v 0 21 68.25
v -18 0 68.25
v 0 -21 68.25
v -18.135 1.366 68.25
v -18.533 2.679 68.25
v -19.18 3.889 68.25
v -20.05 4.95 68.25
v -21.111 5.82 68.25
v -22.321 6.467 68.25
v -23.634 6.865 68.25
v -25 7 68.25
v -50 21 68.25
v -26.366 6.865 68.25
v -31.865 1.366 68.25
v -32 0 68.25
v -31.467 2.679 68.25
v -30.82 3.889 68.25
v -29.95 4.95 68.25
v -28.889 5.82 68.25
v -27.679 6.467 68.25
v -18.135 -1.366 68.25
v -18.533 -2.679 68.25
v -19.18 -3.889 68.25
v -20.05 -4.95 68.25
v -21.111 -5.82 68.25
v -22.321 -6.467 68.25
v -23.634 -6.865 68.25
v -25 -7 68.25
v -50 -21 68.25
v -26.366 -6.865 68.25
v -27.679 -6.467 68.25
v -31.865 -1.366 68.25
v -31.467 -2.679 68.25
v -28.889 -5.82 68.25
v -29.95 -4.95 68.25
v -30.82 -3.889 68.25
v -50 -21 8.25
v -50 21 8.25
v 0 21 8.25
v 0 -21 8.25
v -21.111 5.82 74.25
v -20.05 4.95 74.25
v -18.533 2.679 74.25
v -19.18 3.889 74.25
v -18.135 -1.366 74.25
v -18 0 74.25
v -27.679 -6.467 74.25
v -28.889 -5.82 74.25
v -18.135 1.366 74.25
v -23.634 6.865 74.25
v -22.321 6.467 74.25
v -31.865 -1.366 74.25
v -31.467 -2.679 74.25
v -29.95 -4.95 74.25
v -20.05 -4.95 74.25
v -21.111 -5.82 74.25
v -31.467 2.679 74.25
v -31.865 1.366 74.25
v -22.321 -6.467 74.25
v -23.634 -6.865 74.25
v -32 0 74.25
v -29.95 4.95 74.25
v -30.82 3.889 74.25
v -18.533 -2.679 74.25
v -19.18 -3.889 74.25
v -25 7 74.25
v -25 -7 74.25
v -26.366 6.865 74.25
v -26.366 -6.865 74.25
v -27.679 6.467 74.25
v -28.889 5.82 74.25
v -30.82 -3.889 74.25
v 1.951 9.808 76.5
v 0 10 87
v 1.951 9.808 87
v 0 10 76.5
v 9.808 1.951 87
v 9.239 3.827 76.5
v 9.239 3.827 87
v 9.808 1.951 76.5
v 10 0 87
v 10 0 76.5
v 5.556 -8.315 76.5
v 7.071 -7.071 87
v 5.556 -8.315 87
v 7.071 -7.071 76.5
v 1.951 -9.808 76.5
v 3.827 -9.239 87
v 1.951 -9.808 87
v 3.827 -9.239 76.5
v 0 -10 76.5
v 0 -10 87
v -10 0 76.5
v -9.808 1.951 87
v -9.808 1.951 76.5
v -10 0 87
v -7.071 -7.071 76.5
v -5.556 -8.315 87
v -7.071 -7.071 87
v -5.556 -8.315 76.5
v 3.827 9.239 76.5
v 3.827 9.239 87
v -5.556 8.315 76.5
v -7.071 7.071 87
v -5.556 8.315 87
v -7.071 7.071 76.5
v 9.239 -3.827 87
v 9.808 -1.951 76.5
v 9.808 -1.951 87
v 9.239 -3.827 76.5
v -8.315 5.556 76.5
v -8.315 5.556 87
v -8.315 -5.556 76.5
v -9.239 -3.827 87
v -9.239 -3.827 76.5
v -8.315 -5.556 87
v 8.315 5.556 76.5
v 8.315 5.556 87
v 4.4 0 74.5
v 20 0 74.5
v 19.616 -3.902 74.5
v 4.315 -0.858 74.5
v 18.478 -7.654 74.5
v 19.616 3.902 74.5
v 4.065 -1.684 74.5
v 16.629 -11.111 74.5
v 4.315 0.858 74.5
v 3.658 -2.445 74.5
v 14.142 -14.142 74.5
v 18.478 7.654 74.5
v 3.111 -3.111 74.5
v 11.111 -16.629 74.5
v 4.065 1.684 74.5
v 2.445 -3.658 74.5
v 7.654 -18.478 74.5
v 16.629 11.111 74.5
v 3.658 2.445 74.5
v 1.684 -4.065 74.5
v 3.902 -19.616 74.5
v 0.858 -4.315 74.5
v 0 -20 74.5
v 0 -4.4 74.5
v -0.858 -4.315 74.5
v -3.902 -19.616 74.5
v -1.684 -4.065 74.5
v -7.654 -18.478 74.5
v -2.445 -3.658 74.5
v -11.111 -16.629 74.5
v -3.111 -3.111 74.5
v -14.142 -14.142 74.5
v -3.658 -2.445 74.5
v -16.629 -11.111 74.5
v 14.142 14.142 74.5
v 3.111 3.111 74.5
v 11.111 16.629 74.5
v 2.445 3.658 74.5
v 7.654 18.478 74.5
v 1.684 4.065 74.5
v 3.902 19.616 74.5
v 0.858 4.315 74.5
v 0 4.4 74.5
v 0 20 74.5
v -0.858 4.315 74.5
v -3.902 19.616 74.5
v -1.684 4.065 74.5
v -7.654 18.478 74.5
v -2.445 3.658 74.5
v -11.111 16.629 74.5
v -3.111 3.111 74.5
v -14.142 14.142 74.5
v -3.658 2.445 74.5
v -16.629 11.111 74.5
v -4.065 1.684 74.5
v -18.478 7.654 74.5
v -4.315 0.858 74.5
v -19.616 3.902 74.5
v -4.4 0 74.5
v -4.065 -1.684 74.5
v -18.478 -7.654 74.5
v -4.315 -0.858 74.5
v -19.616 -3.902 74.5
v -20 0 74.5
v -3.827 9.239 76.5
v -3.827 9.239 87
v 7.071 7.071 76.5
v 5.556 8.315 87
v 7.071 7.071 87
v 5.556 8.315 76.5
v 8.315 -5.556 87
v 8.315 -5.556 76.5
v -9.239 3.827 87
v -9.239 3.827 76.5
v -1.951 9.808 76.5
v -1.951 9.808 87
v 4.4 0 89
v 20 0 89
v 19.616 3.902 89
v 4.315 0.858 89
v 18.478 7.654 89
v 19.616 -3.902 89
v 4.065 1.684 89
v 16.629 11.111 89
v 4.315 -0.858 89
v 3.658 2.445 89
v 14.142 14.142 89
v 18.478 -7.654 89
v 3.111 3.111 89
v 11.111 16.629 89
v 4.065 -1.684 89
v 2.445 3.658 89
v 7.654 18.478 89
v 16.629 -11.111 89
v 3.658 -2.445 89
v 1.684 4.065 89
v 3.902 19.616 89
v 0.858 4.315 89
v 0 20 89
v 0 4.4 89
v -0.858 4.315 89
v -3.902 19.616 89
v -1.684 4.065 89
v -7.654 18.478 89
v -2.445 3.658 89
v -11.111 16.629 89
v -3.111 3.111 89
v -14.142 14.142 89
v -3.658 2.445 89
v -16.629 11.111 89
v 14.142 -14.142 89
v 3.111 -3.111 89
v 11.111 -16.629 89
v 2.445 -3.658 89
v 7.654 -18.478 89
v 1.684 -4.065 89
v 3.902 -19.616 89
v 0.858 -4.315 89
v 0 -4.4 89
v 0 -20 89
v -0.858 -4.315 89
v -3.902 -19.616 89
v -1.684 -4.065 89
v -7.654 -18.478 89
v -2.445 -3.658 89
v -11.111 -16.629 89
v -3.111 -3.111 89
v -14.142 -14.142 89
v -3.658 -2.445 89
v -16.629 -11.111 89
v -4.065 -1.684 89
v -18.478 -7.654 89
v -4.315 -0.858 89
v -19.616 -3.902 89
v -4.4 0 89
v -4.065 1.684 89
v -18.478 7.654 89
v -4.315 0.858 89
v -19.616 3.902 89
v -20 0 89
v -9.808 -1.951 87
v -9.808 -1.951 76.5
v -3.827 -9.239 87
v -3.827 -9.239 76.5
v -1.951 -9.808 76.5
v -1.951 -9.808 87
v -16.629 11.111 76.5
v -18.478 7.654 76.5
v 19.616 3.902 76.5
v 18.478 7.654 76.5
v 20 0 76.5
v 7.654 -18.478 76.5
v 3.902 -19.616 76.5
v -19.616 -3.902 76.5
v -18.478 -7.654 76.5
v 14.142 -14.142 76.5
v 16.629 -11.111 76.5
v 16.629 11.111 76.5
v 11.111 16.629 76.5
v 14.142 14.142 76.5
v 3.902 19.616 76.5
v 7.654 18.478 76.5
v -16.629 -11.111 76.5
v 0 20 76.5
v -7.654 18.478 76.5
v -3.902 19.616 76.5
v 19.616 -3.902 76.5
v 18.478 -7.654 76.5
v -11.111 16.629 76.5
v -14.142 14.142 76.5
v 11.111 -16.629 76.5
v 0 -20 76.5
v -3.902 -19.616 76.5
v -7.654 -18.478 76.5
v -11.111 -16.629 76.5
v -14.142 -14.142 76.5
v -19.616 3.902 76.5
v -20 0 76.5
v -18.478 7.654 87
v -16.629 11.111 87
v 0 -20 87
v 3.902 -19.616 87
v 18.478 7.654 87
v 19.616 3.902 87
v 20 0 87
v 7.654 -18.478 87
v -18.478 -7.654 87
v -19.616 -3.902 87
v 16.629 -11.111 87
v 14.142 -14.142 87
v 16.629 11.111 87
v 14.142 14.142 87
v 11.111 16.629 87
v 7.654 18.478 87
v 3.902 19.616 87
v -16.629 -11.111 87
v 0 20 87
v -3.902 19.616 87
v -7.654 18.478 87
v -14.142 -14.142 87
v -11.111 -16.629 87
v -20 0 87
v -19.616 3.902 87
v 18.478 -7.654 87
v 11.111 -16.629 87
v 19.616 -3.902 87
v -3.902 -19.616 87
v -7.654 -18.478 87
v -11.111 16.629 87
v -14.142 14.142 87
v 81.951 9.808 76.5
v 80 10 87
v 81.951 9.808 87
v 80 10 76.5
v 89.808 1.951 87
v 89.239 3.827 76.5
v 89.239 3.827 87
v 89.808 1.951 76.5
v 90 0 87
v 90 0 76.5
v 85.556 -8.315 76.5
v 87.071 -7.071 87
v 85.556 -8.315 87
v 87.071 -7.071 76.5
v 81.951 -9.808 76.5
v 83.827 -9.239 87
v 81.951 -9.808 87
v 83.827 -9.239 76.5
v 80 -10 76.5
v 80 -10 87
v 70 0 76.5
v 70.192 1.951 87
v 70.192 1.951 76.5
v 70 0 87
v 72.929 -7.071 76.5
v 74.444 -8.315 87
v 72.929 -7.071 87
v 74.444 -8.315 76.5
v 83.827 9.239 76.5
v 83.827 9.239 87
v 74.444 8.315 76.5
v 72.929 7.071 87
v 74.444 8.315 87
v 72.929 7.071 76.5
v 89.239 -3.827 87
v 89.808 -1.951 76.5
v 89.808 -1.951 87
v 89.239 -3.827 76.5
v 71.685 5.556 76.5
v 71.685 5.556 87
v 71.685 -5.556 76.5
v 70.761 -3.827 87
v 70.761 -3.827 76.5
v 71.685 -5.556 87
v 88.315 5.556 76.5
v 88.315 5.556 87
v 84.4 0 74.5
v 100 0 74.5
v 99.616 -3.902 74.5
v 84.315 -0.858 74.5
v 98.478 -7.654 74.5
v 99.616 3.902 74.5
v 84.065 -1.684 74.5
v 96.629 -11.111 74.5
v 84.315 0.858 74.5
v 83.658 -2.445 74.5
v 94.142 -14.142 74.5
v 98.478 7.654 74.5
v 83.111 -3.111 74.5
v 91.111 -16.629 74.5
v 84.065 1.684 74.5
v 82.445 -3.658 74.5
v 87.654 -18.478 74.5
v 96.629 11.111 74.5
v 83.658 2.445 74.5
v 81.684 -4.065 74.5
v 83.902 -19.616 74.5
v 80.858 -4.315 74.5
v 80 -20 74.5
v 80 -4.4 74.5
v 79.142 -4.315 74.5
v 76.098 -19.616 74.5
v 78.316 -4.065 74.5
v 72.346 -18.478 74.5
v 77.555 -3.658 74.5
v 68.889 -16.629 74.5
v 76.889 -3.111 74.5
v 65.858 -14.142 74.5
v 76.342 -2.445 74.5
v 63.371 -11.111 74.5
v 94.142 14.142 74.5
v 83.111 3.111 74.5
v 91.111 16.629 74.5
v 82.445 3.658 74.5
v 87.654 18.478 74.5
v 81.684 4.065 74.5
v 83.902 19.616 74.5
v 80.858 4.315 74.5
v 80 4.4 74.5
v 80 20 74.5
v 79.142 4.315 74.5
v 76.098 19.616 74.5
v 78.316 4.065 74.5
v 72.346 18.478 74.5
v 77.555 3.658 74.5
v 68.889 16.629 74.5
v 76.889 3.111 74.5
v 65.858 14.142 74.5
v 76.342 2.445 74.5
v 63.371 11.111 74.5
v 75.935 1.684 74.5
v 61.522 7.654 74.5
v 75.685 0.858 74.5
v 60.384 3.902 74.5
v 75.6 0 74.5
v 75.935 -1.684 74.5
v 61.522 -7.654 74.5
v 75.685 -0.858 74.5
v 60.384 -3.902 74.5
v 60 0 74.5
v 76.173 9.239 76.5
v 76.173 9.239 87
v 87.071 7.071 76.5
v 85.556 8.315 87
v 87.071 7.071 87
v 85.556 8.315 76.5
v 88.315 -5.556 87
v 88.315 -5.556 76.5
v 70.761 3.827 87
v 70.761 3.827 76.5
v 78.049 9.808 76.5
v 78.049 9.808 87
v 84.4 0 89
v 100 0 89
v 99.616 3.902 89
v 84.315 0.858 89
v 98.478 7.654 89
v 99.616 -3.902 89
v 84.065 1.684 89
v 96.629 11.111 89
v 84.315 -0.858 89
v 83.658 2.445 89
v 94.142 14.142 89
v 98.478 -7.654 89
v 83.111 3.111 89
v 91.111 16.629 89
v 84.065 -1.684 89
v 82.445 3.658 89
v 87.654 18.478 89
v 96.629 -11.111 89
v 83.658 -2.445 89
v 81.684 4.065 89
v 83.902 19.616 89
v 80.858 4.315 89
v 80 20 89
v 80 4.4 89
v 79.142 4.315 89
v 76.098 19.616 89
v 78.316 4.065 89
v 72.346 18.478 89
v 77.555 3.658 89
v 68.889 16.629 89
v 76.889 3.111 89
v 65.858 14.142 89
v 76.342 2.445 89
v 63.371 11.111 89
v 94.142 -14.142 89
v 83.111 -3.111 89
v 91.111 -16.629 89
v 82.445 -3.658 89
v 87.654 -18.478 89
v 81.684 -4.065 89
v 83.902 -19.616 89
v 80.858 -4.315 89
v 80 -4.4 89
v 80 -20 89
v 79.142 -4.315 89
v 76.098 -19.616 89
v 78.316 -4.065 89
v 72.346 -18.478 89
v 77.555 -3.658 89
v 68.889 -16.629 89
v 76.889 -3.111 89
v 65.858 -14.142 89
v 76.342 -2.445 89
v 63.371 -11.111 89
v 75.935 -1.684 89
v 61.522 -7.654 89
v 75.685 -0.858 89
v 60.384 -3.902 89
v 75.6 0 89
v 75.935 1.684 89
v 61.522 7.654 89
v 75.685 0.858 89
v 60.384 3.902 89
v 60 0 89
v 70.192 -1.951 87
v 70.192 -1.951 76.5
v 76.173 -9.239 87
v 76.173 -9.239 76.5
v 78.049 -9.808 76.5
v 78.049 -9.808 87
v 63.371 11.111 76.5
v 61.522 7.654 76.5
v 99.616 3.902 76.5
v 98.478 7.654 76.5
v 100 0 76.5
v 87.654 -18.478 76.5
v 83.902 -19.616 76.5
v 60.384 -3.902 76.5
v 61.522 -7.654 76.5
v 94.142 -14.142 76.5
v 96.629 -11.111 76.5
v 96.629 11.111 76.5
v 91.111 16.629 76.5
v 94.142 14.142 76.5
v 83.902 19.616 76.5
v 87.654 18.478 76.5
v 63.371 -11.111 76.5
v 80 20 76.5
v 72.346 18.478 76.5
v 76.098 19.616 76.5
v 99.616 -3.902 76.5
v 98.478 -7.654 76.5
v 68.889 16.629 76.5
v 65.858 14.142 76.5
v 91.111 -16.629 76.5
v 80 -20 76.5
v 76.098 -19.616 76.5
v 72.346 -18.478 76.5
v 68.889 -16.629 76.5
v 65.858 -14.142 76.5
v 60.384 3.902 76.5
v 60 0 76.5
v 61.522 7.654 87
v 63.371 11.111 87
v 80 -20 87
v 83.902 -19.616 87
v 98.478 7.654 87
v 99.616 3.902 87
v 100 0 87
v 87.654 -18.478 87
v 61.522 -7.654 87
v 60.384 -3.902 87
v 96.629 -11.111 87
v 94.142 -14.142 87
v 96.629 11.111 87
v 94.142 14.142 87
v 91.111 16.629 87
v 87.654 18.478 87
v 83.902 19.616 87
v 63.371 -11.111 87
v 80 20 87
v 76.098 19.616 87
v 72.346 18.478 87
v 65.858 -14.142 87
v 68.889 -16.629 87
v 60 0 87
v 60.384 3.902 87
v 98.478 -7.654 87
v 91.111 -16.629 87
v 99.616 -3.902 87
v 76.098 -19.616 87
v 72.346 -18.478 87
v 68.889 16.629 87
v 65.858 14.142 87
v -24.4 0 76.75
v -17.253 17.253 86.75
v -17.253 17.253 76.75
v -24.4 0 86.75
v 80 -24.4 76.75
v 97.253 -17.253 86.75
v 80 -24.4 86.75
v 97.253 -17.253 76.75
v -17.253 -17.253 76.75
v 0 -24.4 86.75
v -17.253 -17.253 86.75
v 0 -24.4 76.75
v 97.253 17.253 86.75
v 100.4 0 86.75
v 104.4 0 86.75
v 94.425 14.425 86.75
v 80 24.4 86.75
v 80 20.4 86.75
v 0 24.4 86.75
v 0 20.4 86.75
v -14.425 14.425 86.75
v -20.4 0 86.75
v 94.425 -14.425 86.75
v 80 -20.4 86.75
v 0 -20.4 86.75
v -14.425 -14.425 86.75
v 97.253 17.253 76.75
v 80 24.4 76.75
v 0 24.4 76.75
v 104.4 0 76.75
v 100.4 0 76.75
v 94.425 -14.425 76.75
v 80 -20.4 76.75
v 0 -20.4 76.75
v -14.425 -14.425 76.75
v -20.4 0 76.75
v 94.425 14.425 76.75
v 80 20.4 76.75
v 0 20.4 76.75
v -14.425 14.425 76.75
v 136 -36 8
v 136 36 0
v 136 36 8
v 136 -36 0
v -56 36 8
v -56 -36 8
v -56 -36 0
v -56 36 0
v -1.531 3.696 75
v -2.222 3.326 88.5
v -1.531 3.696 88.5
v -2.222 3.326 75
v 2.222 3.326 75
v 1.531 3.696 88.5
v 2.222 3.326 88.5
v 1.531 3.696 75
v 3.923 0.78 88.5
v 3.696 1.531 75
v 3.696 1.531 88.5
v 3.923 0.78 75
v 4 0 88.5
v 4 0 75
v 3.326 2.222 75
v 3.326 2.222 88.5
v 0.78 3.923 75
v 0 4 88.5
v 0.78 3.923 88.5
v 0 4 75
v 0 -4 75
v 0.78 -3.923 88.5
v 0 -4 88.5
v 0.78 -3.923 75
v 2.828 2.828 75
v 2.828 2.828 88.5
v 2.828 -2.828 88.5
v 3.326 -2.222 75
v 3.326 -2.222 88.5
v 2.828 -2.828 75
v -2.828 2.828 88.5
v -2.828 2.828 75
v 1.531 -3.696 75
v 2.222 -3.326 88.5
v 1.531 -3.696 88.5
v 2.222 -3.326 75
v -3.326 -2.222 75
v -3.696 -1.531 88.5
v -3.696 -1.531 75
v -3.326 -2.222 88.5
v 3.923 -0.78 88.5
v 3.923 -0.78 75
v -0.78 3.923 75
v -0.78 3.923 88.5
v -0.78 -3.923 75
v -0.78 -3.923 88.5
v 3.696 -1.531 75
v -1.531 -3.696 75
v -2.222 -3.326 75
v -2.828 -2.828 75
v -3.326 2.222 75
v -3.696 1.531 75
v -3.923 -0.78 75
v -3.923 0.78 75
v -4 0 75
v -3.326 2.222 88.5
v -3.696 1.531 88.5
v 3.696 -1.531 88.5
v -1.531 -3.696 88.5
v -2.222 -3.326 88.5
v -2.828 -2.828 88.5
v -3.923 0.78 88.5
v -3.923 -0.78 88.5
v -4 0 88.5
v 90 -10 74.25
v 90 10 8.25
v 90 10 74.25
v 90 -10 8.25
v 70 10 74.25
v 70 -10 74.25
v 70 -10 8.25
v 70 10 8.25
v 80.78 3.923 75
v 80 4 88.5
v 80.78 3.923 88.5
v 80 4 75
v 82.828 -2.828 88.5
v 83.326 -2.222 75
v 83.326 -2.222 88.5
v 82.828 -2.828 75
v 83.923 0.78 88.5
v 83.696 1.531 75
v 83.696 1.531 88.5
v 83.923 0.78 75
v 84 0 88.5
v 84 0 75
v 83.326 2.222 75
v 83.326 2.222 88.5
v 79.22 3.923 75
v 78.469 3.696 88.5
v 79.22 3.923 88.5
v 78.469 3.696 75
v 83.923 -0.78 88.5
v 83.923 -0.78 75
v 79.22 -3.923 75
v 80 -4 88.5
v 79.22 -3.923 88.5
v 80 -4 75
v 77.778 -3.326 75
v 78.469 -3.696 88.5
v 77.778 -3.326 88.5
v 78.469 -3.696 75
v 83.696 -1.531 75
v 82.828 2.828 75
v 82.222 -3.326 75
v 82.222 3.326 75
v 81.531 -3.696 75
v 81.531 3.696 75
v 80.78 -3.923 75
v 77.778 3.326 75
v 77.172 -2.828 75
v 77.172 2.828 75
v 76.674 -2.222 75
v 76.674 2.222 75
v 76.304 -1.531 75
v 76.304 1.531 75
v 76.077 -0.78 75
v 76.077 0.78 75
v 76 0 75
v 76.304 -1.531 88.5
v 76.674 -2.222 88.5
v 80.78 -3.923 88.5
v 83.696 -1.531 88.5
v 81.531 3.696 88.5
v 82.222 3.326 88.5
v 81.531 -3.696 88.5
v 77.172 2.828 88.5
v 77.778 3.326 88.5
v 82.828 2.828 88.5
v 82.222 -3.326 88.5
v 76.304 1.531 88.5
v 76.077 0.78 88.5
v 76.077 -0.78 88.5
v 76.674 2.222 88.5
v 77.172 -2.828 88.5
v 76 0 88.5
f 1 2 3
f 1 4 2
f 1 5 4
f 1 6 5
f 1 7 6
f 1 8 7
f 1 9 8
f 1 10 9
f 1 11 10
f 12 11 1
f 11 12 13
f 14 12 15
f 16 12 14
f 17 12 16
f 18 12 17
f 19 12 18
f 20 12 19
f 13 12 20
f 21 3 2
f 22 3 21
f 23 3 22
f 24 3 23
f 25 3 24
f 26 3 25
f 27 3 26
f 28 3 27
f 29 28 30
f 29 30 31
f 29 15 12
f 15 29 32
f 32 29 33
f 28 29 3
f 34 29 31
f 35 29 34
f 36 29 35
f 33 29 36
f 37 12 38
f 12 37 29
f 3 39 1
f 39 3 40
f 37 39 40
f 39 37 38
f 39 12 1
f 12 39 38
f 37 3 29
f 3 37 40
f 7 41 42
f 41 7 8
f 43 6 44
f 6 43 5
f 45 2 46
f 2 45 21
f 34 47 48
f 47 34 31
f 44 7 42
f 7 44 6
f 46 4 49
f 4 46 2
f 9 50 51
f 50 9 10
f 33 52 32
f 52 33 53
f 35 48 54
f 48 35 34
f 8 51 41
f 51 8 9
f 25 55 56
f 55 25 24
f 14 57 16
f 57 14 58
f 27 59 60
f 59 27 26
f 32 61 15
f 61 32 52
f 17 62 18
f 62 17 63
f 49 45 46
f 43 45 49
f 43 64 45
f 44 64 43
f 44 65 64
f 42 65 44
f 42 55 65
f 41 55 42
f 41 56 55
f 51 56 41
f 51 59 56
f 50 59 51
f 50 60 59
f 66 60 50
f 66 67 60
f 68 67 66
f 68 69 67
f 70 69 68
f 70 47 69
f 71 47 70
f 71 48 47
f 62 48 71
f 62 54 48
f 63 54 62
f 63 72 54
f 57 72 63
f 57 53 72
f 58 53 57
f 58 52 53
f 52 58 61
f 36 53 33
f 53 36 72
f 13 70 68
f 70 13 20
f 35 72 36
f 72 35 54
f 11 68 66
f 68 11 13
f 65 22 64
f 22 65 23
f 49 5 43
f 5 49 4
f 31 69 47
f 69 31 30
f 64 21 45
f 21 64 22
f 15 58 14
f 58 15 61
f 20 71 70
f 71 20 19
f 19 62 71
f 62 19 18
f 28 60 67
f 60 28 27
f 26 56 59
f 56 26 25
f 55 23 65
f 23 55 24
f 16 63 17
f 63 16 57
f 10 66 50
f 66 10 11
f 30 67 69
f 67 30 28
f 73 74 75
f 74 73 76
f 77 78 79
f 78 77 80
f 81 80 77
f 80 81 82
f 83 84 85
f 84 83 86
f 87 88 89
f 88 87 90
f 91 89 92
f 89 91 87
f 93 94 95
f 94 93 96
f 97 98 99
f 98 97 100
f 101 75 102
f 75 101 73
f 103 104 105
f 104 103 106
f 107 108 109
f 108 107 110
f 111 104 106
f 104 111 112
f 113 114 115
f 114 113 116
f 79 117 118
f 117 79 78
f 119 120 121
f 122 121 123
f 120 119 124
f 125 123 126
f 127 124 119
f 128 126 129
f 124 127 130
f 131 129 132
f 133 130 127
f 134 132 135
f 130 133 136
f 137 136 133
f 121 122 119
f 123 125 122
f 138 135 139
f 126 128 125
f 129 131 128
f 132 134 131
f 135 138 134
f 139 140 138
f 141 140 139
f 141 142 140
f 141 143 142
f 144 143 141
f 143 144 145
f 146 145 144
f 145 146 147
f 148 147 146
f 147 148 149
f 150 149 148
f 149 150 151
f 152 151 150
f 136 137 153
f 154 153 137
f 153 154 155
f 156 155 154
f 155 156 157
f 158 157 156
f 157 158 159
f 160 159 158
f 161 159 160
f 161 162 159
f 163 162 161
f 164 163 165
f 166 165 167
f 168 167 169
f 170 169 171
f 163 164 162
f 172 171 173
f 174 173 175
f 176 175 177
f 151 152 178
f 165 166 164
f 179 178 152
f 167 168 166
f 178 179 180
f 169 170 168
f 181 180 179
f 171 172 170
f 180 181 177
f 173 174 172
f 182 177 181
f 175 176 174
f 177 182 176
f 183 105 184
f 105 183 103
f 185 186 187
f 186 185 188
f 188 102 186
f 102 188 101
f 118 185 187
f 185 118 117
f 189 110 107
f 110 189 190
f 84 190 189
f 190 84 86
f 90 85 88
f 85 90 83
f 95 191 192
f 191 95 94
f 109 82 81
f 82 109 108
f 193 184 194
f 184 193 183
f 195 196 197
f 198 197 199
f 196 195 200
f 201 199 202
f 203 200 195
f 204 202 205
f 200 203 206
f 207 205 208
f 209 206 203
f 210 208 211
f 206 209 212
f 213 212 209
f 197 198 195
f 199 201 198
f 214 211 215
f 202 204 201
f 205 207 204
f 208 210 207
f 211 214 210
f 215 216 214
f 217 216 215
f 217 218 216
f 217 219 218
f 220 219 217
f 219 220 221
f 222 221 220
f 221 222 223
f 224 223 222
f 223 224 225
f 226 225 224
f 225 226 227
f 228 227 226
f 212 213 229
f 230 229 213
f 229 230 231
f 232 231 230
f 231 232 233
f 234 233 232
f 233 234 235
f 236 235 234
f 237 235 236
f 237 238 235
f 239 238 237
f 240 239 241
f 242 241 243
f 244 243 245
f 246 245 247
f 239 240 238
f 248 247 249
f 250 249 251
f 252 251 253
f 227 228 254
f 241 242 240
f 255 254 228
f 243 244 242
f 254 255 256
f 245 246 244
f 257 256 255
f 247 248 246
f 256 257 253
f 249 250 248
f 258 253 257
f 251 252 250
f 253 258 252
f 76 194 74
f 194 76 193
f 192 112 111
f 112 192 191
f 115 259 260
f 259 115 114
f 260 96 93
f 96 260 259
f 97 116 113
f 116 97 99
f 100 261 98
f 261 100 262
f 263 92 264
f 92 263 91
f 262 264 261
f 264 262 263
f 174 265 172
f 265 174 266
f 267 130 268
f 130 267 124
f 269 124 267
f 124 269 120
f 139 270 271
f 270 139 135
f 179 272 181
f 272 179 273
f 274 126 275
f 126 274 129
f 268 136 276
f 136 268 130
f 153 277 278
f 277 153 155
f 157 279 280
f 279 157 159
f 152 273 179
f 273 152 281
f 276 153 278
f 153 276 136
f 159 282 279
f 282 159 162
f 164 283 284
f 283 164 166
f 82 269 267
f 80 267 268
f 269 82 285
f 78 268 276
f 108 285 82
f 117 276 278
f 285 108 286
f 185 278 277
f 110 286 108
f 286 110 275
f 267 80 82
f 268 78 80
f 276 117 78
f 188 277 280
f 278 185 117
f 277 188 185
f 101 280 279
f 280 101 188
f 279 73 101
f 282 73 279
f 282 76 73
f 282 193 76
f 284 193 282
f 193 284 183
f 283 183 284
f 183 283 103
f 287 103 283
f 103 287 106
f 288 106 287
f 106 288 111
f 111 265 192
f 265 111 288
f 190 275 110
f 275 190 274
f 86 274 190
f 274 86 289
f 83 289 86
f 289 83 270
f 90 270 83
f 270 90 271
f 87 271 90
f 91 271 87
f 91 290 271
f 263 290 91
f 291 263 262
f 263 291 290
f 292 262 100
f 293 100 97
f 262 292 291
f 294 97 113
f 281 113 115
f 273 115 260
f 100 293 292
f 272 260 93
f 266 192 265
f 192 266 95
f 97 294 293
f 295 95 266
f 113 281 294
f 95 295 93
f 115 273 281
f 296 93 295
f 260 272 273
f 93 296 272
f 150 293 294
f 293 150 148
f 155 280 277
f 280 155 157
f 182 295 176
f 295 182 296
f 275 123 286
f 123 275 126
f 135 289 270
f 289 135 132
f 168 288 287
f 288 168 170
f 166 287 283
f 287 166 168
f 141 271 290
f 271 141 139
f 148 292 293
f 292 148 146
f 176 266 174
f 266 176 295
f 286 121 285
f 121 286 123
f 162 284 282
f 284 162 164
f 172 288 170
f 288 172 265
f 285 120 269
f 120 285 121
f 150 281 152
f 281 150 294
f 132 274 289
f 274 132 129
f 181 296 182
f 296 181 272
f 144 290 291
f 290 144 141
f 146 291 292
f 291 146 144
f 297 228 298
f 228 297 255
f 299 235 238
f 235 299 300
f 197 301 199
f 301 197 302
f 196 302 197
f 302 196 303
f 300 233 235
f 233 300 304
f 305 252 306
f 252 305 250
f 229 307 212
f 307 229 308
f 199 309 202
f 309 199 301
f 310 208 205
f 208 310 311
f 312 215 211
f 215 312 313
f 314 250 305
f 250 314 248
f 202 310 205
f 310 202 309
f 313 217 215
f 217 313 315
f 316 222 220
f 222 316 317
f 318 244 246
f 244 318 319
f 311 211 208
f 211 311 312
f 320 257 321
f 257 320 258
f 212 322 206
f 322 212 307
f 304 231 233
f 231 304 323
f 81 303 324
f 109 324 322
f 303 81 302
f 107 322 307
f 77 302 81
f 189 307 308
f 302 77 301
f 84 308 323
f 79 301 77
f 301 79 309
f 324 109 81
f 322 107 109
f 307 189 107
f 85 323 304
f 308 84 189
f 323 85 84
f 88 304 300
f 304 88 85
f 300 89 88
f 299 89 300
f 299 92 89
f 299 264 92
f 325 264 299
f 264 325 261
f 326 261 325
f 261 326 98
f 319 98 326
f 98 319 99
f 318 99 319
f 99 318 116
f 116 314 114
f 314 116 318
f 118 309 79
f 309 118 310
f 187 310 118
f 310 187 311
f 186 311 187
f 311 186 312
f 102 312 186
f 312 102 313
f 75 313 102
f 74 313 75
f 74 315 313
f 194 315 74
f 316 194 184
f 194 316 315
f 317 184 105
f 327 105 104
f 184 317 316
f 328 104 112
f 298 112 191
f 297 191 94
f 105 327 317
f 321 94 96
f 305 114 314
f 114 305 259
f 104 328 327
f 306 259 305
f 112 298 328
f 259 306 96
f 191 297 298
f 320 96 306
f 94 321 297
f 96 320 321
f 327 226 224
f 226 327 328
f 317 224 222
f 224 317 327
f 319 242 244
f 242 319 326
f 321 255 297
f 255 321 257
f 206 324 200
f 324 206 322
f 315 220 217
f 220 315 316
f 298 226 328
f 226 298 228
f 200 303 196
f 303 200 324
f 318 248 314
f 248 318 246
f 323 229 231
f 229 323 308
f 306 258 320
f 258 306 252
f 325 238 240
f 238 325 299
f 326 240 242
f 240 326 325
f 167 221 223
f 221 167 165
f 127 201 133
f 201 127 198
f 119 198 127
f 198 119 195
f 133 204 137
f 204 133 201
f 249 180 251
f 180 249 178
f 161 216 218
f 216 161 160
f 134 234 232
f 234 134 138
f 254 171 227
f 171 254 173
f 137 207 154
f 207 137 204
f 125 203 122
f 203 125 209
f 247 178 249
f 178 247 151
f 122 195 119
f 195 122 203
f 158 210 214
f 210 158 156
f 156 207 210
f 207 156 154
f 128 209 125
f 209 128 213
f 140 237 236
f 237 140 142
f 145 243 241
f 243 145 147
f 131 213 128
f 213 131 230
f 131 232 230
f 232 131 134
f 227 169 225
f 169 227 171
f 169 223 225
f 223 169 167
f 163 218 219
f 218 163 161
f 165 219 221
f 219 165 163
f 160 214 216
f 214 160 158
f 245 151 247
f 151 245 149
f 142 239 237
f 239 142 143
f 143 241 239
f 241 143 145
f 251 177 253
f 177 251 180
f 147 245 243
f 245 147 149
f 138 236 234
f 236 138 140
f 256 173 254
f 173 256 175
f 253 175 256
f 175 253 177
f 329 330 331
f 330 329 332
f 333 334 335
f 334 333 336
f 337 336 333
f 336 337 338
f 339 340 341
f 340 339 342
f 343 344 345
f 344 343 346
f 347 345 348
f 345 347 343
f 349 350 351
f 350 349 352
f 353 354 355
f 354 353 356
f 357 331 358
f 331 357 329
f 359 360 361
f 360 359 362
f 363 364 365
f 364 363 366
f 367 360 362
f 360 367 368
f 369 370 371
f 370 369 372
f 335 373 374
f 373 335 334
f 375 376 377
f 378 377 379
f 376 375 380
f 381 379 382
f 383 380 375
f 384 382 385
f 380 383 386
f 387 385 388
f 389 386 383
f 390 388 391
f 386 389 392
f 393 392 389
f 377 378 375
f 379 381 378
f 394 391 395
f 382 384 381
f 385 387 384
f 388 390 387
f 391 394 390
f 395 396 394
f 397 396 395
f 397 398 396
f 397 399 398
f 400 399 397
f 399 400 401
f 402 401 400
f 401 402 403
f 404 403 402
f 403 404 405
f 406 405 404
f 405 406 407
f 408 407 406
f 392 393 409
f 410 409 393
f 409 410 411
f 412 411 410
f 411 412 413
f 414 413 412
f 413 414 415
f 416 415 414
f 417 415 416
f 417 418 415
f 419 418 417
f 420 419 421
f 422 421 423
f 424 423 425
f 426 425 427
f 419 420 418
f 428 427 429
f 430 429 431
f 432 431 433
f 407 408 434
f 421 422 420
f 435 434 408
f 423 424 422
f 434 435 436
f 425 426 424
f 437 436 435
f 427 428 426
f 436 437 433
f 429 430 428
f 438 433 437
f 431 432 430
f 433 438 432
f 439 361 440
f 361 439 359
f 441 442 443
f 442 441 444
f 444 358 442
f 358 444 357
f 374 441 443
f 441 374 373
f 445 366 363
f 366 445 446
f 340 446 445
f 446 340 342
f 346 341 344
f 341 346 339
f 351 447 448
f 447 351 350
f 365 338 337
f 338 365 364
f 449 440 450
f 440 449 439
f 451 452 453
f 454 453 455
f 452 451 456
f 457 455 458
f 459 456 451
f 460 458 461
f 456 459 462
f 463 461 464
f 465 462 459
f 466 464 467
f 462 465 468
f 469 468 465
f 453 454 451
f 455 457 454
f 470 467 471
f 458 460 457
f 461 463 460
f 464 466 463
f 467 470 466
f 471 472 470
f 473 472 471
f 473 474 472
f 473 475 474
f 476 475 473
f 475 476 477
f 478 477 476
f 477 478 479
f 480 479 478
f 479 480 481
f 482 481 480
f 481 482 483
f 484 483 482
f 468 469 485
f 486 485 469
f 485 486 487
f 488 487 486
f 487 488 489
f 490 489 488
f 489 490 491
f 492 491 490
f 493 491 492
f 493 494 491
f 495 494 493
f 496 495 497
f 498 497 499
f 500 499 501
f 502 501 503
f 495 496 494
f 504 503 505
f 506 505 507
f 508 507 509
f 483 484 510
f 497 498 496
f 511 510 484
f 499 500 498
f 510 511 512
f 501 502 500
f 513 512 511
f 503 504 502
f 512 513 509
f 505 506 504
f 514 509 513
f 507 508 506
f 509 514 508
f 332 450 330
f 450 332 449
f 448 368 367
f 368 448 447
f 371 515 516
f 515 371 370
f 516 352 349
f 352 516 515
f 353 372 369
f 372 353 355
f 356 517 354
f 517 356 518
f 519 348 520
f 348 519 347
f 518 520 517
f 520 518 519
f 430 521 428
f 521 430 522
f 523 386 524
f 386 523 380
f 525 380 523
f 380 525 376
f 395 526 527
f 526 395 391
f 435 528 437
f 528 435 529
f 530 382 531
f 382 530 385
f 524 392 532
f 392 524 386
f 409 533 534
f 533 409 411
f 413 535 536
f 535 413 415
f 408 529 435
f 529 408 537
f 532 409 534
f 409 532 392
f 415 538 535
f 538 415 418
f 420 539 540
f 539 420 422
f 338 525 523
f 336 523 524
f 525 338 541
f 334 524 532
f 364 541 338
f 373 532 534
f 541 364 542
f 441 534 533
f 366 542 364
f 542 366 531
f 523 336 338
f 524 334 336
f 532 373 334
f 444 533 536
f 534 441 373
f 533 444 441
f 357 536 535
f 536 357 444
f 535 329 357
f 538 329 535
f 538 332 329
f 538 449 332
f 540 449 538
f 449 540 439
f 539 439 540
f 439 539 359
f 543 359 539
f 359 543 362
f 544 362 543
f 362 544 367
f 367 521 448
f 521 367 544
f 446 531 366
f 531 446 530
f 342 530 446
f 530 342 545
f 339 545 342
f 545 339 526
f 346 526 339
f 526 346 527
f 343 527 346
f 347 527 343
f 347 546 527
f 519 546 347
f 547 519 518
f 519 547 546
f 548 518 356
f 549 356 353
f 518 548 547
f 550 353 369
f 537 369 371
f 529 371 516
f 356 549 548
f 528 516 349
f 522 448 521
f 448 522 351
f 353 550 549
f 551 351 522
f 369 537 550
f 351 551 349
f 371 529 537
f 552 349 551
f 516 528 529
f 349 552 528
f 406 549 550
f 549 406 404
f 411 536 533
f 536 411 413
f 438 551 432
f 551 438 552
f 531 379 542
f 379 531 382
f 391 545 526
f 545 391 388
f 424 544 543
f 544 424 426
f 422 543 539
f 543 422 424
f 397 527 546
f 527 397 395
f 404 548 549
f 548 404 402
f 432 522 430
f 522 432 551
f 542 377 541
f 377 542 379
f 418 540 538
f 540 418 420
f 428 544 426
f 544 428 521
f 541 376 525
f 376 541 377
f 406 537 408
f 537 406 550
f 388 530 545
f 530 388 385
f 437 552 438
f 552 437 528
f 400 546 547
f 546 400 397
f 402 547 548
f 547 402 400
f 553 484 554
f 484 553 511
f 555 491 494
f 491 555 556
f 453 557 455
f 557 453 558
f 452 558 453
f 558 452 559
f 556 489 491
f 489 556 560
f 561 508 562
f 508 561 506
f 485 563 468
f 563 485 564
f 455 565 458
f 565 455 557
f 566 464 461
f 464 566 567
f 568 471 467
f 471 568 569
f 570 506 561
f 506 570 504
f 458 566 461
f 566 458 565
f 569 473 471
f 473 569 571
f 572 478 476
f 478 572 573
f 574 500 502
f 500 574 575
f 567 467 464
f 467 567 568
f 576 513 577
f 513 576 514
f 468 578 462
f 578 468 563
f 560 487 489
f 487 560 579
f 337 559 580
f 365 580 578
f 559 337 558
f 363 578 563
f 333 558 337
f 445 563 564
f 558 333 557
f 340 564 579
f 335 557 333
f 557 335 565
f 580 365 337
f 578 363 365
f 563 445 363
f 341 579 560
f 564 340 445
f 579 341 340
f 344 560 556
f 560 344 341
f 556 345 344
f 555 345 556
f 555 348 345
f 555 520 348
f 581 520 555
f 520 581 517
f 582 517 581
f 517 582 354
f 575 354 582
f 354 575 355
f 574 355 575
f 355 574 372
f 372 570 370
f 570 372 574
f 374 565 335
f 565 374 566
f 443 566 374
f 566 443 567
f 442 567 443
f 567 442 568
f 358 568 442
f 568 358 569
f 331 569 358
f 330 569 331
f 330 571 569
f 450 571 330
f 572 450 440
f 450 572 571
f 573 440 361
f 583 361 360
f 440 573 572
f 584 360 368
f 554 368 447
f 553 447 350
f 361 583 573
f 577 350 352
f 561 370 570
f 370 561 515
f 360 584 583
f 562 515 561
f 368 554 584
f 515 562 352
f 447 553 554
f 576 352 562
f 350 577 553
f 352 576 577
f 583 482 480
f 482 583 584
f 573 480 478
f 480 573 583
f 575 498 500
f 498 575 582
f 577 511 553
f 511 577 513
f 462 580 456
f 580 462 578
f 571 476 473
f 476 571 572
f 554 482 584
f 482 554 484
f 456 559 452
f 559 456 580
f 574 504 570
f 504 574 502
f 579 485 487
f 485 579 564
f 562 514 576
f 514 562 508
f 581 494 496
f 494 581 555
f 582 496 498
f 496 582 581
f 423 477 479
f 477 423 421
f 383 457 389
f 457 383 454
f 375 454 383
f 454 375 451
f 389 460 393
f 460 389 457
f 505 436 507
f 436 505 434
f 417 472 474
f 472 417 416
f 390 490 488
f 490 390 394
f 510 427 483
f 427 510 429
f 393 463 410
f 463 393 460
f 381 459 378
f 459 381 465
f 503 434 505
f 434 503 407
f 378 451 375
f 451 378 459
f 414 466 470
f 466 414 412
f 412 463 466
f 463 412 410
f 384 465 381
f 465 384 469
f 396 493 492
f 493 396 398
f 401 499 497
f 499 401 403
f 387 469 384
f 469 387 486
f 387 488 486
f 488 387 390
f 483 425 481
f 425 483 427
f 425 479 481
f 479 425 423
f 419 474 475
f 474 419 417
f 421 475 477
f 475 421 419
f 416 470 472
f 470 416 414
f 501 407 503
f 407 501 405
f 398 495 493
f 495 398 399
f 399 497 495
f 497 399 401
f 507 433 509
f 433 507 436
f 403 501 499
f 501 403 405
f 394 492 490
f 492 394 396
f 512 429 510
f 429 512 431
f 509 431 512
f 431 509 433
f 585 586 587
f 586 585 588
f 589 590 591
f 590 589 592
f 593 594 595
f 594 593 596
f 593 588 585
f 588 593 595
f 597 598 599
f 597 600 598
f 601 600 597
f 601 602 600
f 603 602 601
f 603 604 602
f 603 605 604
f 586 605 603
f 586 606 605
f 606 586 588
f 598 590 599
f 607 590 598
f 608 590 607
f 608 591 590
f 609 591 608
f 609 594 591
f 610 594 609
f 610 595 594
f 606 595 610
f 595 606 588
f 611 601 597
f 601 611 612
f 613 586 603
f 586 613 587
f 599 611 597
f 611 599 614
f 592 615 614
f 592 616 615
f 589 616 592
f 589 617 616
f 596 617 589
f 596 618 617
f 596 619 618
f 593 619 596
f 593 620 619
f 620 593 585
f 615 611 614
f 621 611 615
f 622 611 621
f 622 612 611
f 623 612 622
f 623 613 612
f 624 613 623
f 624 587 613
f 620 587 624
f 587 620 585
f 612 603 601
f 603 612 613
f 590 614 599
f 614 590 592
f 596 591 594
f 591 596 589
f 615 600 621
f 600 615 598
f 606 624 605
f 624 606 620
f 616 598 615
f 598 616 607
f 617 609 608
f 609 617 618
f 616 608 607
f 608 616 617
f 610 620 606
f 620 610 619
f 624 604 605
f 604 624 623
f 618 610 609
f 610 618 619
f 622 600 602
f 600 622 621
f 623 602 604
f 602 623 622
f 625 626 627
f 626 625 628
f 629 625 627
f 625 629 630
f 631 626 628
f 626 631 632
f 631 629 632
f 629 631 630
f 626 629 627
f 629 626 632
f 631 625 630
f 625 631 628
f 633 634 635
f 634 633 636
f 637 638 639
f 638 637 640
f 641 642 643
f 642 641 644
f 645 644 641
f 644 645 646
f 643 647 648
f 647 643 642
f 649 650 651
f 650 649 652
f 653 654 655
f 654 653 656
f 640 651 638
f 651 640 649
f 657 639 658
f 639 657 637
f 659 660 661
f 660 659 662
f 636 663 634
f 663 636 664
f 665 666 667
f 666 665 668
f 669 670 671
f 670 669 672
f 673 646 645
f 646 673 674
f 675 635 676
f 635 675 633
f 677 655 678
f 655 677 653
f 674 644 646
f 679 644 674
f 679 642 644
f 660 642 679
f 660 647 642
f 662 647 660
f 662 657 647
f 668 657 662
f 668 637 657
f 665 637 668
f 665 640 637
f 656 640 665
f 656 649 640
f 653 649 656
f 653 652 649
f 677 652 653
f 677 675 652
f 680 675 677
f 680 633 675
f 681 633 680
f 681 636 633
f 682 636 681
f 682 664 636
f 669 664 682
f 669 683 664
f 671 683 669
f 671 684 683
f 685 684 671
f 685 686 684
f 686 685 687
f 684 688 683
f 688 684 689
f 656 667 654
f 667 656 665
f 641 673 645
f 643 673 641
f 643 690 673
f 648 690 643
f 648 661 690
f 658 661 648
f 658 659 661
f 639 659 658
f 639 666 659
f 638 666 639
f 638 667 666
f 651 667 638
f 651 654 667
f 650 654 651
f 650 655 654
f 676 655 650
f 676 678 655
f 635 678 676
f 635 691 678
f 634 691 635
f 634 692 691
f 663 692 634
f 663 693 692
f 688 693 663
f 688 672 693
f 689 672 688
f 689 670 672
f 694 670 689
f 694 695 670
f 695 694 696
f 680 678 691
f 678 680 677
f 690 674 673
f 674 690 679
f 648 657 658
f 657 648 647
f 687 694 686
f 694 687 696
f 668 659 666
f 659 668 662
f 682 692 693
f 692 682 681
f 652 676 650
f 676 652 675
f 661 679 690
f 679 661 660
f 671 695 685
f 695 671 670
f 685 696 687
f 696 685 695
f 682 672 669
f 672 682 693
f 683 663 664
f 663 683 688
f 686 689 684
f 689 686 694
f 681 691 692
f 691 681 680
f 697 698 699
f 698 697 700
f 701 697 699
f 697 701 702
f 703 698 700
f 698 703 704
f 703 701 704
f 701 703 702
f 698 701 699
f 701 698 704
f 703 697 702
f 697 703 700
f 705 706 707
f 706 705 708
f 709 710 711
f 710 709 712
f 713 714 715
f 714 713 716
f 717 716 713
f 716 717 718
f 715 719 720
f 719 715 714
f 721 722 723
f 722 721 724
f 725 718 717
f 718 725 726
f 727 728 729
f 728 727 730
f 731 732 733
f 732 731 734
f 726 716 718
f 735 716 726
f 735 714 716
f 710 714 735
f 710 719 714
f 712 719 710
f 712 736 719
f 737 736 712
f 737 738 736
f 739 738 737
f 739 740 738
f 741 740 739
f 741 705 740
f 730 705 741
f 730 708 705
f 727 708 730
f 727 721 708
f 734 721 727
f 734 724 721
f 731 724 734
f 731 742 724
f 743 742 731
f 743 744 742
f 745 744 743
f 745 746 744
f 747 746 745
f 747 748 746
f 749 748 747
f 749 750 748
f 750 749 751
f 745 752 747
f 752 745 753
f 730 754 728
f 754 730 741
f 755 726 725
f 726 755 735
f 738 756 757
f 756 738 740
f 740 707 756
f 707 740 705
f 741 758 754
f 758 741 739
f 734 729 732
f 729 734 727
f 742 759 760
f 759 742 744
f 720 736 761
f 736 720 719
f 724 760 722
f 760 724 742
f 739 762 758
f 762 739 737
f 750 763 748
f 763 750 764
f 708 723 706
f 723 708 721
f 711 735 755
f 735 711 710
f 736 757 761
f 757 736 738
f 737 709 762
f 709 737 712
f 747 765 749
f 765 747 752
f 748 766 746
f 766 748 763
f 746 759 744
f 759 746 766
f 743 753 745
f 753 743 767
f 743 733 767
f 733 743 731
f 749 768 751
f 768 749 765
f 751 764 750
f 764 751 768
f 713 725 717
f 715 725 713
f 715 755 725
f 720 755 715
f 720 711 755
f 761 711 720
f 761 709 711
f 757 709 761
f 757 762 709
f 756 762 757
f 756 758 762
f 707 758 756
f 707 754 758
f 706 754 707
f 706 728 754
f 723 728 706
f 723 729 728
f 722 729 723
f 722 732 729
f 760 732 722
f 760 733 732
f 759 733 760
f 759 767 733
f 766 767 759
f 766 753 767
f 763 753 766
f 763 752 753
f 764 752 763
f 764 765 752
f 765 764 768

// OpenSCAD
$fn = 32;

// ------------------------------------------------------------------------
// Motor belt drive: span 80 mm, pulleys d40, belt 10 mm wide
// Every part is its own module, assembly() places every instance.
// ------------------------------------------------------------------------

// --- part 1 ---
module base_plate() {
  difference() {
    translate([-96, -36, 0]) cube([192, 72, 8]);
  }
}

// --- part 2 ---
module motor() {
  union() {
    translate([-30, -21, 0]) cube([60, 42, 50]);
    translate([33, 0, 25]) rotate([0, 90, 0]) cylinder(h = 6, d = 14, center = true);
  }
}

// --- part 3 ---
module drive_shaft() {
  translate([0, 0, -6.75]) cylinder(h = 13.5, d = 8);
}

// --- part 4 ---
module pulley_drive() {
  difference() {
    union() {
      cylinder(h = 14.5, d = 20);
      cylinder(h = 2, d = 40);
      translate([0, 0, 12.5]) cylinder(h = 2, d = 40);
    }
    translate([0, 0, -1]) cylinder(h = 16.5, d = 8.8);
  }
}

// --- part 5 ---
module idler_post() {
  translate([-10, -10, 0]) cube([20, 20, 66]);
}

// --- part 6 ---
module driven_shaft() {
  translate([0, 0, -6.75]) cylinder(h = 13.5, d = 8);
}

// --- part 7 ---
module pulley_driven() {
  difference() {
    union() {
      cylinder(h = 14.5, d = 20);
      cylinder(h = 2, d = 40);
      translate([0, 0, 12.5]) cylinder(h = 2, d = 40);
    }
    translate([0, 0, -1]) cylinder(h = 16.5, d = 8.8);
  }
}

// --- part 8 ---
module drive_belt() {
  difference() {
    linear_extrude(height = 10) polygon(points = concat([for (a = [90 : 45 : 270]) [24.4 * cos(a), 24.4 * sin(a)]], [for (a = [270 : 45 : 450]) [80 + 24.4 * cos(a), 24.4 * sin(a)]]));
    translate([0, 0, -1]) linear_extrude(height = 12) polygon(points = concat([for (a = [90 : 45 : 270]) [20.4 * cos(a), 20.4 * sin(a)]], [for (a = [270 : 45 : 450]) [80 + 20.4 * cos(a), 20.4 * sin(a)]]));
  }
}

// --- assembly ---
module assembly() {
  color([0.80, 0.24, 0.20]) translate([40, 0, 0]) rotate([0, 0, 0]) base_plate();
  color([0.20, 0.45, 0.75]) translate([0, 0, 38.25]) rotate([0, 270, 0]) motor();
  color([0.25, 0.62, 0.32]) translate([0, 0, 81.75]) rotate([0, 0, 0]) drive_shaft();
  color([0.92, 0.70, 0.18]) translate([0, 0, 74.5]) rotate([0, 0, 0]) pulley_drive();
  color([0.58, 0.35, 0.70]) translate([80, 0, 8.25]) rotate([0, 0, 0]) idler_post();
  color([0.16, 0.66, 0.66]) translate([80, 0, 81.75]) rotate([0, 0, 0]) driven_shaft();
  color([0.85, 0.48, 0.18]) translate([80, 0, 74.5]) rotate([0, 0, 0]) pulley_driven();
  color([0.55, 0.60, 0.65]) translate([0, 0, 76.75]) rotate([0, 0, 0]) drive_belt();
}

assembly();
